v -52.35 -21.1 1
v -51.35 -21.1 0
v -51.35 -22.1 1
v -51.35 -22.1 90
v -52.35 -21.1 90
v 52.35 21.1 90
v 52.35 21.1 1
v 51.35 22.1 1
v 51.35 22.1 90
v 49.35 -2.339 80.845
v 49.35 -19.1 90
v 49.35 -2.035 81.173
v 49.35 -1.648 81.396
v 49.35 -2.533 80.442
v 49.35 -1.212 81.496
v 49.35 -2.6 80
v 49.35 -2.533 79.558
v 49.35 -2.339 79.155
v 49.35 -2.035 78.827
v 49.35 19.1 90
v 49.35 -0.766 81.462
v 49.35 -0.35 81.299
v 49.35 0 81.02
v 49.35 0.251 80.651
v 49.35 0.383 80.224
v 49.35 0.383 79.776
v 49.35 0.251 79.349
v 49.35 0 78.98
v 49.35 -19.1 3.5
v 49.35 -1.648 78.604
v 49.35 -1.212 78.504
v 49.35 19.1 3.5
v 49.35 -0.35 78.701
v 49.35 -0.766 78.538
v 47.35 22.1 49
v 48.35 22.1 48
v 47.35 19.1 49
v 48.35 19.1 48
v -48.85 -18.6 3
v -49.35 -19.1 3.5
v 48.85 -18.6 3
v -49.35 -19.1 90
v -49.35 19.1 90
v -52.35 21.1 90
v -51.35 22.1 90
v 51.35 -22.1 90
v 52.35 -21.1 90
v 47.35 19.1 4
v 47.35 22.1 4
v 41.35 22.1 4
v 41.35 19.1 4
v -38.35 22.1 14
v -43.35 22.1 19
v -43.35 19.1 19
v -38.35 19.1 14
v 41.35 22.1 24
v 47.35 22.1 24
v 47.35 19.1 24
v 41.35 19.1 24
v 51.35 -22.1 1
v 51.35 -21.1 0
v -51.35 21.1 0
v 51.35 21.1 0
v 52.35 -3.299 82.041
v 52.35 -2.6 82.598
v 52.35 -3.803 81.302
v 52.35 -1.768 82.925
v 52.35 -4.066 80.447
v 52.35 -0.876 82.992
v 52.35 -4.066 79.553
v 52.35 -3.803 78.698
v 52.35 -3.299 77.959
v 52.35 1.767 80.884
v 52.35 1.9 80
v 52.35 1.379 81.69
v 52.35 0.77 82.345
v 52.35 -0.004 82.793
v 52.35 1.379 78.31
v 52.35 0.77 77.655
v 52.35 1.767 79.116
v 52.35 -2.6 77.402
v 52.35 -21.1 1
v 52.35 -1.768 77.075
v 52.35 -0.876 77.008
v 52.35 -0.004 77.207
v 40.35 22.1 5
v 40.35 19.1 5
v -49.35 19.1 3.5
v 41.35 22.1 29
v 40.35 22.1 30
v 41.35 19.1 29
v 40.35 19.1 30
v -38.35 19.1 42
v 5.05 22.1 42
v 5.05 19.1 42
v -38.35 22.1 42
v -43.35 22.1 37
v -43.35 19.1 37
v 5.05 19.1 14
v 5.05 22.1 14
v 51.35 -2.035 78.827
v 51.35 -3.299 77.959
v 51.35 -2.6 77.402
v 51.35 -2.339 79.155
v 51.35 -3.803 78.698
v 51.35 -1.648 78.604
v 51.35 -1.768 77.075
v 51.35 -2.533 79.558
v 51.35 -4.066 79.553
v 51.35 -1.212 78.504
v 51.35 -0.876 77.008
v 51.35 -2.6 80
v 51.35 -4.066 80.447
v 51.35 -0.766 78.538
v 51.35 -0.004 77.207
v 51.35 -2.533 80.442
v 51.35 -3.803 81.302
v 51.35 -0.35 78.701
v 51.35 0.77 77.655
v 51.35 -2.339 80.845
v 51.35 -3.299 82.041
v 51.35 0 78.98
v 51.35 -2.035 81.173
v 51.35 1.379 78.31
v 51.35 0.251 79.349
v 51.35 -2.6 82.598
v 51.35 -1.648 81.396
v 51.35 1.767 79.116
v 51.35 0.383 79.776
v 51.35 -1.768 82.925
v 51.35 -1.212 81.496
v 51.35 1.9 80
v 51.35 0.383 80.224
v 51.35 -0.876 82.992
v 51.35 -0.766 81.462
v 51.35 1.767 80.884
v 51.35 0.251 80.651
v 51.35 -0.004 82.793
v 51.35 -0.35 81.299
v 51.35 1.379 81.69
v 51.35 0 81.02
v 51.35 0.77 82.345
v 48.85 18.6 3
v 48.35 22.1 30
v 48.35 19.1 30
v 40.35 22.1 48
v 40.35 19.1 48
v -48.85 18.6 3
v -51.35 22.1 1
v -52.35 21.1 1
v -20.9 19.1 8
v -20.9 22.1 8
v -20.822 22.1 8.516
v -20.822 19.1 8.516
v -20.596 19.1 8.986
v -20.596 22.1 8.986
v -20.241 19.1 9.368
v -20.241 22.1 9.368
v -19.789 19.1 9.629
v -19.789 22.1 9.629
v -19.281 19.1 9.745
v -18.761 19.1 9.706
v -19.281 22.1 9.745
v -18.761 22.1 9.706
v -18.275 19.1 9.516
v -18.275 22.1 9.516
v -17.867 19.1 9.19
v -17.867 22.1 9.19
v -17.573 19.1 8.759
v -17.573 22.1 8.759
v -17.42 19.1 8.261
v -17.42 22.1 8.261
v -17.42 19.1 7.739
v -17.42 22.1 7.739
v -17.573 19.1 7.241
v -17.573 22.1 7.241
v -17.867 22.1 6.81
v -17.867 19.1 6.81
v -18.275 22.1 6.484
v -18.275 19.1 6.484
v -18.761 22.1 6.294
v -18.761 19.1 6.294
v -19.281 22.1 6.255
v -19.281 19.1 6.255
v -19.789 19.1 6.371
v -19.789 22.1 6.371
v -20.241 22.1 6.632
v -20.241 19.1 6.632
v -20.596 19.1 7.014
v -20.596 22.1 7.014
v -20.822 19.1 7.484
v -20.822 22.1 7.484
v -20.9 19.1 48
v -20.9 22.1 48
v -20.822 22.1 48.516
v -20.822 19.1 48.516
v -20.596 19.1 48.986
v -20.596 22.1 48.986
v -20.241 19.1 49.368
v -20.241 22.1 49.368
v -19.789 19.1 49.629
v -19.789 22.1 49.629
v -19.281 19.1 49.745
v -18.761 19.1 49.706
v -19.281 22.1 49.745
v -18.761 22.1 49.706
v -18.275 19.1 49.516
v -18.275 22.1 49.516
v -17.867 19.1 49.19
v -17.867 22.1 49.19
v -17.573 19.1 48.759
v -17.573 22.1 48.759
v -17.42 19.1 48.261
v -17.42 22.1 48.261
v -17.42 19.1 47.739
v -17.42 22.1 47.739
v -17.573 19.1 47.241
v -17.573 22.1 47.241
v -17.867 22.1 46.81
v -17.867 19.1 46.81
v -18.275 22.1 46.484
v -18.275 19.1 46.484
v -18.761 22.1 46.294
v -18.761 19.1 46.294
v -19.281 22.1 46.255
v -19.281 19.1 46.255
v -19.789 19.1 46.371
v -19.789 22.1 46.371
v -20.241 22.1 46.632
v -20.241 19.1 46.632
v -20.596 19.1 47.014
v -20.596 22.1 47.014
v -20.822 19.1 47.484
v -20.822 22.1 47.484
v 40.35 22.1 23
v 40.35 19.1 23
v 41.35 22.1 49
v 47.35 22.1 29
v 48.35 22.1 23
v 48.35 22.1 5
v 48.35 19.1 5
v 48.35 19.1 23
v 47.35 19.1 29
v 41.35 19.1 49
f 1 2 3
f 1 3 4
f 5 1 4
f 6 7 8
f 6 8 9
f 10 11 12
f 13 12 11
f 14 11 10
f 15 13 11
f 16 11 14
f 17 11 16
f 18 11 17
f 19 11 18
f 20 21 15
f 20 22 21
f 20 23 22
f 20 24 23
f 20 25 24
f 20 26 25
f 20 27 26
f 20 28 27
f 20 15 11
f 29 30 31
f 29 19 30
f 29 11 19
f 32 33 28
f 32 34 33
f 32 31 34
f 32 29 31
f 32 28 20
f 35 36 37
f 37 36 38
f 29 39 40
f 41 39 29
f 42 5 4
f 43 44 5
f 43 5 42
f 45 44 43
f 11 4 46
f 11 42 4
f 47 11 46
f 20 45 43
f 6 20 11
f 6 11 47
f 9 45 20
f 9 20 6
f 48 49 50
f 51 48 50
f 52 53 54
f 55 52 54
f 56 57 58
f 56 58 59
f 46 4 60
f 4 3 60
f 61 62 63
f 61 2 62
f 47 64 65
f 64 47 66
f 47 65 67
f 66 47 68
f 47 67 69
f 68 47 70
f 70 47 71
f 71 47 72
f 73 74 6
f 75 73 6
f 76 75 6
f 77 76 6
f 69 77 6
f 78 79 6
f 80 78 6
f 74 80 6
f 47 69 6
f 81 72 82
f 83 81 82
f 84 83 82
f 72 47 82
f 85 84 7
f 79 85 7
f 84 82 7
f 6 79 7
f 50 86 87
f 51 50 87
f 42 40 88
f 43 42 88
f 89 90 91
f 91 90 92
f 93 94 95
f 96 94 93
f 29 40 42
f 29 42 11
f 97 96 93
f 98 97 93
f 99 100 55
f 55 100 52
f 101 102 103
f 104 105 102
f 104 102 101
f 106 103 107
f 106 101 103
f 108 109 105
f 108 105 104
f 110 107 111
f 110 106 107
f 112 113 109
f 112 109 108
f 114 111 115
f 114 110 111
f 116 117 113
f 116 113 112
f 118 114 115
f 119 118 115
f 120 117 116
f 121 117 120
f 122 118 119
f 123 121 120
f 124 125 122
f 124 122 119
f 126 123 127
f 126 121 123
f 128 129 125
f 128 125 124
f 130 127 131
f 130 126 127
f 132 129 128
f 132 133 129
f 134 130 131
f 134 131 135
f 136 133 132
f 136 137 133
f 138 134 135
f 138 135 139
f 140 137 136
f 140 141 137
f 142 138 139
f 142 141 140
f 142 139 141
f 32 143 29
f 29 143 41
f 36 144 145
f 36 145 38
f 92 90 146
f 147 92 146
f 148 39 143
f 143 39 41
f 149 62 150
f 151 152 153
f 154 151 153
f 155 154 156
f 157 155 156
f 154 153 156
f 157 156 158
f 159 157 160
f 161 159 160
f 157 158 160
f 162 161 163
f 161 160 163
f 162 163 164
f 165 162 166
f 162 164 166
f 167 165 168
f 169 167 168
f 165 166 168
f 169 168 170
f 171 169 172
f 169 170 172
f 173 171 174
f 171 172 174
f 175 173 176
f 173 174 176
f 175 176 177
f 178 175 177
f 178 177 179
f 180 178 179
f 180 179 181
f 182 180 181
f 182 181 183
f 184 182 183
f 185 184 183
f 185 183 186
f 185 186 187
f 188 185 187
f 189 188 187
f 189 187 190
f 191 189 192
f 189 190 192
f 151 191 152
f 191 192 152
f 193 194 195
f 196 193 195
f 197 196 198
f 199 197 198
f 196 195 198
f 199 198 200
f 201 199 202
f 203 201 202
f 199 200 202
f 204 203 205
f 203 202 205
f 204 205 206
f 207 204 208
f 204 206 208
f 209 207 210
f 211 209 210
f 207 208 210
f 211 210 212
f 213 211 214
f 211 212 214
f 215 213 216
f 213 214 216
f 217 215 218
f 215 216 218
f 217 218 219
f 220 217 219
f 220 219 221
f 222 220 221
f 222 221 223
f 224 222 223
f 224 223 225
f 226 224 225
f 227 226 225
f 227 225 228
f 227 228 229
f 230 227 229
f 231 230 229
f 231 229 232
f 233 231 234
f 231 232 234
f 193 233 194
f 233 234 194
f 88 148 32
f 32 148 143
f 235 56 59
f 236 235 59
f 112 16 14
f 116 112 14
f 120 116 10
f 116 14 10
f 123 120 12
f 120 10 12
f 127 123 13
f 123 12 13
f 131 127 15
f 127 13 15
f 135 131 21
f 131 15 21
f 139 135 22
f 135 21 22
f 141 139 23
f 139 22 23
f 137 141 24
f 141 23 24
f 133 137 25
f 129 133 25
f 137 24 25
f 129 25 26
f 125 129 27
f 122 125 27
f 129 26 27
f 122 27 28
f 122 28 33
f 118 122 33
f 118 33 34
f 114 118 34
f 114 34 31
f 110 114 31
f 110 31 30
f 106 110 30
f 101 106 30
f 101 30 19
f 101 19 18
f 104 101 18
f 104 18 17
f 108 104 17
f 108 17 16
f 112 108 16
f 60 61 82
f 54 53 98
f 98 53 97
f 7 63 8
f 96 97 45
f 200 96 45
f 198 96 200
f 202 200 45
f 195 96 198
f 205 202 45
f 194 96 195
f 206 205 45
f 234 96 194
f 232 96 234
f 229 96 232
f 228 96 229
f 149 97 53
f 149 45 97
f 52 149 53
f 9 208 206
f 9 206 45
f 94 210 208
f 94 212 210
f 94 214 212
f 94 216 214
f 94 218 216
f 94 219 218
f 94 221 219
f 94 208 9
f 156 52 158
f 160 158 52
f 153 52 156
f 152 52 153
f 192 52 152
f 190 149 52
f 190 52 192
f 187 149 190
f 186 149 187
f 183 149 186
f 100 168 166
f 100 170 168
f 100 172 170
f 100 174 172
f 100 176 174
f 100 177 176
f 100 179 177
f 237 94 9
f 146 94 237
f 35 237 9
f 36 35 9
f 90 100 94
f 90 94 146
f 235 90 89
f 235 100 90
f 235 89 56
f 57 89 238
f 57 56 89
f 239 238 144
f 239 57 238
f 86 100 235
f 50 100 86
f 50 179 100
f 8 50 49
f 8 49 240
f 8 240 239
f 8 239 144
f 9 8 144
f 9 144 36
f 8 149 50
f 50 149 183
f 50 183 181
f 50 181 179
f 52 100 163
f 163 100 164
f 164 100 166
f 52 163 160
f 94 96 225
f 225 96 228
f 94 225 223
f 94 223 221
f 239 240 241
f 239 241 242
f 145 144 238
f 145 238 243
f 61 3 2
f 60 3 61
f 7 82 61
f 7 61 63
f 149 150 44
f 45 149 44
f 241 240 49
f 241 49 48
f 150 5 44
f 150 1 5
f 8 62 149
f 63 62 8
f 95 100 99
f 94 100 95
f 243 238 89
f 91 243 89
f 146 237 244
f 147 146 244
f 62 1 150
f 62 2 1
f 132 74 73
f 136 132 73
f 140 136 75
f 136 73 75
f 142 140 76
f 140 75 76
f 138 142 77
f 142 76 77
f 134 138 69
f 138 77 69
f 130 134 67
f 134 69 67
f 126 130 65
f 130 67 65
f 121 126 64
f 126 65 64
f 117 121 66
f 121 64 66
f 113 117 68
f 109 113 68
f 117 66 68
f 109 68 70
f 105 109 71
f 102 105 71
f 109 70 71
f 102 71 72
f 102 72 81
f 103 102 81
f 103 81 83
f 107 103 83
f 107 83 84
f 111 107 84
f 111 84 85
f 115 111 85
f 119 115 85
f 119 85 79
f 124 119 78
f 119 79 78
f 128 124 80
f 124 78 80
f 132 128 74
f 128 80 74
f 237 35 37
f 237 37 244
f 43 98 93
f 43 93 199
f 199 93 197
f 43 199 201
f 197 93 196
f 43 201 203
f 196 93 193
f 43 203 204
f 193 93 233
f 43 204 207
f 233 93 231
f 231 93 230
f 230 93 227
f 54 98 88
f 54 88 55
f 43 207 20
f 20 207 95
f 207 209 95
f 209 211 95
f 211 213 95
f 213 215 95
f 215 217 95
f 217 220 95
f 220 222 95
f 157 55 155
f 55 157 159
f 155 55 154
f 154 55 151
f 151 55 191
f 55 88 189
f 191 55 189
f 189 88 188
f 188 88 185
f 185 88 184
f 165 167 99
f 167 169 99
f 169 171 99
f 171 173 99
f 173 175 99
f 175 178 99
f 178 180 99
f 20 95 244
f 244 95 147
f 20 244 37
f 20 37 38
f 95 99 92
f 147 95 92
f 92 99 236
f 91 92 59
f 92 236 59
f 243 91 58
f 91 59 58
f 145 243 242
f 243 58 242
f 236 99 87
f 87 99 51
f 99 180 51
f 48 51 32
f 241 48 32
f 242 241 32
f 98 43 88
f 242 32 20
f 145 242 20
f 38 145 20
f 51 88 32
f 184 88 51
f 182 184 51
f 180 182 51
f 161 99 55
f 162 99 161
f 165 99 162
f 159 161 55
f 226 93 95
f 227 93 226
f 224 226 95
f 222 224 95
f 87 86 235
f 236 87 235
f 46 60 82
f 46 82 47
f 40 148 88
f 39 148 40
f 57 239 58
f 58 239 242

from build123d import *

# Parameters (mm, degrees)
F0_W      = 104.7
F0_H      = 44.2
F0_W_2    = 98.7
F0_H_2    = 38.2
F1_DEPTH  = 90
F2_W      = 98.7
F2_H      = 38.2
F3_DEPTH  = 3
F4_R      = 1.5
F5_DEPTH  = 3
F6_R      = 3
F7_DEPTH  = 1
F8_W      = 48.4
F8_H      = 28
F8_R      = 1.75
F9_DEPTH  = 3
F10_SIZE  = 5
F11_W     = 8
F11_H     = 20
F12_DEPTH = 3
F13_SIZE  = 1
F14_SIZE  = 1
F15_SIZE  = 0.5


with BuildPart() as f1:
    # F0 (on Top) → F1 (new body)
    with BuildSketch(Plane.XY):
        Rectangle(F0_W, F0_H)
        Rectangle(F0_W_2, F0_H_2, mode=Mode.SUBTRACT)
    extrude(amount=F1_DEPTH)

    # F2 (on face) → F3 (join)
    with BuildSketch(Plane(origin=(0, 0, 0), x_dir=(1, 0, 0), z_dir=(0, 0, -1))):
        Rectangle(F2_W, F2_H)
    extrude(amount=-F3_DEPTH)

    # F4 (on face) → F5 (cut)
    with BuildSketch(Plane(origin=(49.35, 0, 0), x_dir=(0, -1, 0), z_dir=(-1, 0, 0))):
        with Locations((1.1, 80)):
            Circle(F4_R)
    extrude(amount=-F5_DEPTH, mode=Mode.SUBTRACT)

    # F6 (on face) → F7 (cut)
    with BuildSketch(Plane.YZ.offset(52.35)):
        with Locations((-1.1, 80)):
            Circle(F6_R)
    extrude(amount=-F7_DEPTH, mode=Mode.SUBTRACT)

    # F8 (on face) → F9 (cut)
    with BuildSketch(Plane(origin=(0, 22.1, 0), x_dir=(-1, 0, 0), z_dir=(0, 1, 0))):
        with Locations((19.15, 28)):
            Rectangle(F8_W, F8_H)
        with Locations((19.15, 8)):
            Circle(F8_R)
        with Locations((19.15, 48)):
            Circle(F8_R)
    extrude(amount=-F9_DEPTH, mode=Mode.SUBTRACT)

    # F10
    f10_edges = [f1.edges().sort_by_distance(p)[0] for p in [
        (-43.35, 20.6, 42),
        (-43.35, 20.6, 14),
    ]]
    chamfer(f10_edges, length=F10_SIZE)

    # F11 (on face) → F12 (cut)
    with BuildSketch(Plane(origin=(0, 22.1, 0), x_dir=(-1, 0, 0), z_dir=(0, 1, 0))):
        with Locations((-44.35, 14)):
            Rectangle(F11_W, F11_H)
        with Locations((-44.35, 39)):
            Rectangle(F11_W, F11_H)
    extrude(amount=-F12_DEPTH, mode=Mode.SUBTRACT)

    # F13
    f13_edges = [f1.edges().sort_by_distance(p)[0] for p in [
        (40.35, 20.6, 24),
        (48.35, 20.6, 24),
        (48.35, 20.6, 4),
        (40.35, 20.6, 4),
        (48.35, 20.6, 29),
        (40.35, 20.6, 29),
        (40.35, 20.6, 49),
        (48.35, 20.6, 49),
    ]]
    chamfer(f13_edges, length=F13_SIZE)

    # F14
    f14_edges = [f1.edges().sort_by_distance(p)[0] for p in [
        (0, 22.1, 0),
        (-52.35, 0, 0),
        (0, -22.1, 0),
        (52.35, 0, 0),
        (52.35, 22.1, 45),
        (52.35, -22.1, 45),
        (-52.35, -22.1, 45),
        (-52.35, 22.1, 45),
    ]]
    chamfer(f14_edges, length=F14_SIZE)

    # F15
    f15_edges = [f1.edges().sort_by_distance(p)[0] for p in [
        (0, -19.1, 3),
        (-49.35, 0, 3),
        (0, 19.1, 3),
        (49.35, 0, 3),
    ]]
    chamfer(f15_edges, length=F15_SIZE)


solid = f1.part
